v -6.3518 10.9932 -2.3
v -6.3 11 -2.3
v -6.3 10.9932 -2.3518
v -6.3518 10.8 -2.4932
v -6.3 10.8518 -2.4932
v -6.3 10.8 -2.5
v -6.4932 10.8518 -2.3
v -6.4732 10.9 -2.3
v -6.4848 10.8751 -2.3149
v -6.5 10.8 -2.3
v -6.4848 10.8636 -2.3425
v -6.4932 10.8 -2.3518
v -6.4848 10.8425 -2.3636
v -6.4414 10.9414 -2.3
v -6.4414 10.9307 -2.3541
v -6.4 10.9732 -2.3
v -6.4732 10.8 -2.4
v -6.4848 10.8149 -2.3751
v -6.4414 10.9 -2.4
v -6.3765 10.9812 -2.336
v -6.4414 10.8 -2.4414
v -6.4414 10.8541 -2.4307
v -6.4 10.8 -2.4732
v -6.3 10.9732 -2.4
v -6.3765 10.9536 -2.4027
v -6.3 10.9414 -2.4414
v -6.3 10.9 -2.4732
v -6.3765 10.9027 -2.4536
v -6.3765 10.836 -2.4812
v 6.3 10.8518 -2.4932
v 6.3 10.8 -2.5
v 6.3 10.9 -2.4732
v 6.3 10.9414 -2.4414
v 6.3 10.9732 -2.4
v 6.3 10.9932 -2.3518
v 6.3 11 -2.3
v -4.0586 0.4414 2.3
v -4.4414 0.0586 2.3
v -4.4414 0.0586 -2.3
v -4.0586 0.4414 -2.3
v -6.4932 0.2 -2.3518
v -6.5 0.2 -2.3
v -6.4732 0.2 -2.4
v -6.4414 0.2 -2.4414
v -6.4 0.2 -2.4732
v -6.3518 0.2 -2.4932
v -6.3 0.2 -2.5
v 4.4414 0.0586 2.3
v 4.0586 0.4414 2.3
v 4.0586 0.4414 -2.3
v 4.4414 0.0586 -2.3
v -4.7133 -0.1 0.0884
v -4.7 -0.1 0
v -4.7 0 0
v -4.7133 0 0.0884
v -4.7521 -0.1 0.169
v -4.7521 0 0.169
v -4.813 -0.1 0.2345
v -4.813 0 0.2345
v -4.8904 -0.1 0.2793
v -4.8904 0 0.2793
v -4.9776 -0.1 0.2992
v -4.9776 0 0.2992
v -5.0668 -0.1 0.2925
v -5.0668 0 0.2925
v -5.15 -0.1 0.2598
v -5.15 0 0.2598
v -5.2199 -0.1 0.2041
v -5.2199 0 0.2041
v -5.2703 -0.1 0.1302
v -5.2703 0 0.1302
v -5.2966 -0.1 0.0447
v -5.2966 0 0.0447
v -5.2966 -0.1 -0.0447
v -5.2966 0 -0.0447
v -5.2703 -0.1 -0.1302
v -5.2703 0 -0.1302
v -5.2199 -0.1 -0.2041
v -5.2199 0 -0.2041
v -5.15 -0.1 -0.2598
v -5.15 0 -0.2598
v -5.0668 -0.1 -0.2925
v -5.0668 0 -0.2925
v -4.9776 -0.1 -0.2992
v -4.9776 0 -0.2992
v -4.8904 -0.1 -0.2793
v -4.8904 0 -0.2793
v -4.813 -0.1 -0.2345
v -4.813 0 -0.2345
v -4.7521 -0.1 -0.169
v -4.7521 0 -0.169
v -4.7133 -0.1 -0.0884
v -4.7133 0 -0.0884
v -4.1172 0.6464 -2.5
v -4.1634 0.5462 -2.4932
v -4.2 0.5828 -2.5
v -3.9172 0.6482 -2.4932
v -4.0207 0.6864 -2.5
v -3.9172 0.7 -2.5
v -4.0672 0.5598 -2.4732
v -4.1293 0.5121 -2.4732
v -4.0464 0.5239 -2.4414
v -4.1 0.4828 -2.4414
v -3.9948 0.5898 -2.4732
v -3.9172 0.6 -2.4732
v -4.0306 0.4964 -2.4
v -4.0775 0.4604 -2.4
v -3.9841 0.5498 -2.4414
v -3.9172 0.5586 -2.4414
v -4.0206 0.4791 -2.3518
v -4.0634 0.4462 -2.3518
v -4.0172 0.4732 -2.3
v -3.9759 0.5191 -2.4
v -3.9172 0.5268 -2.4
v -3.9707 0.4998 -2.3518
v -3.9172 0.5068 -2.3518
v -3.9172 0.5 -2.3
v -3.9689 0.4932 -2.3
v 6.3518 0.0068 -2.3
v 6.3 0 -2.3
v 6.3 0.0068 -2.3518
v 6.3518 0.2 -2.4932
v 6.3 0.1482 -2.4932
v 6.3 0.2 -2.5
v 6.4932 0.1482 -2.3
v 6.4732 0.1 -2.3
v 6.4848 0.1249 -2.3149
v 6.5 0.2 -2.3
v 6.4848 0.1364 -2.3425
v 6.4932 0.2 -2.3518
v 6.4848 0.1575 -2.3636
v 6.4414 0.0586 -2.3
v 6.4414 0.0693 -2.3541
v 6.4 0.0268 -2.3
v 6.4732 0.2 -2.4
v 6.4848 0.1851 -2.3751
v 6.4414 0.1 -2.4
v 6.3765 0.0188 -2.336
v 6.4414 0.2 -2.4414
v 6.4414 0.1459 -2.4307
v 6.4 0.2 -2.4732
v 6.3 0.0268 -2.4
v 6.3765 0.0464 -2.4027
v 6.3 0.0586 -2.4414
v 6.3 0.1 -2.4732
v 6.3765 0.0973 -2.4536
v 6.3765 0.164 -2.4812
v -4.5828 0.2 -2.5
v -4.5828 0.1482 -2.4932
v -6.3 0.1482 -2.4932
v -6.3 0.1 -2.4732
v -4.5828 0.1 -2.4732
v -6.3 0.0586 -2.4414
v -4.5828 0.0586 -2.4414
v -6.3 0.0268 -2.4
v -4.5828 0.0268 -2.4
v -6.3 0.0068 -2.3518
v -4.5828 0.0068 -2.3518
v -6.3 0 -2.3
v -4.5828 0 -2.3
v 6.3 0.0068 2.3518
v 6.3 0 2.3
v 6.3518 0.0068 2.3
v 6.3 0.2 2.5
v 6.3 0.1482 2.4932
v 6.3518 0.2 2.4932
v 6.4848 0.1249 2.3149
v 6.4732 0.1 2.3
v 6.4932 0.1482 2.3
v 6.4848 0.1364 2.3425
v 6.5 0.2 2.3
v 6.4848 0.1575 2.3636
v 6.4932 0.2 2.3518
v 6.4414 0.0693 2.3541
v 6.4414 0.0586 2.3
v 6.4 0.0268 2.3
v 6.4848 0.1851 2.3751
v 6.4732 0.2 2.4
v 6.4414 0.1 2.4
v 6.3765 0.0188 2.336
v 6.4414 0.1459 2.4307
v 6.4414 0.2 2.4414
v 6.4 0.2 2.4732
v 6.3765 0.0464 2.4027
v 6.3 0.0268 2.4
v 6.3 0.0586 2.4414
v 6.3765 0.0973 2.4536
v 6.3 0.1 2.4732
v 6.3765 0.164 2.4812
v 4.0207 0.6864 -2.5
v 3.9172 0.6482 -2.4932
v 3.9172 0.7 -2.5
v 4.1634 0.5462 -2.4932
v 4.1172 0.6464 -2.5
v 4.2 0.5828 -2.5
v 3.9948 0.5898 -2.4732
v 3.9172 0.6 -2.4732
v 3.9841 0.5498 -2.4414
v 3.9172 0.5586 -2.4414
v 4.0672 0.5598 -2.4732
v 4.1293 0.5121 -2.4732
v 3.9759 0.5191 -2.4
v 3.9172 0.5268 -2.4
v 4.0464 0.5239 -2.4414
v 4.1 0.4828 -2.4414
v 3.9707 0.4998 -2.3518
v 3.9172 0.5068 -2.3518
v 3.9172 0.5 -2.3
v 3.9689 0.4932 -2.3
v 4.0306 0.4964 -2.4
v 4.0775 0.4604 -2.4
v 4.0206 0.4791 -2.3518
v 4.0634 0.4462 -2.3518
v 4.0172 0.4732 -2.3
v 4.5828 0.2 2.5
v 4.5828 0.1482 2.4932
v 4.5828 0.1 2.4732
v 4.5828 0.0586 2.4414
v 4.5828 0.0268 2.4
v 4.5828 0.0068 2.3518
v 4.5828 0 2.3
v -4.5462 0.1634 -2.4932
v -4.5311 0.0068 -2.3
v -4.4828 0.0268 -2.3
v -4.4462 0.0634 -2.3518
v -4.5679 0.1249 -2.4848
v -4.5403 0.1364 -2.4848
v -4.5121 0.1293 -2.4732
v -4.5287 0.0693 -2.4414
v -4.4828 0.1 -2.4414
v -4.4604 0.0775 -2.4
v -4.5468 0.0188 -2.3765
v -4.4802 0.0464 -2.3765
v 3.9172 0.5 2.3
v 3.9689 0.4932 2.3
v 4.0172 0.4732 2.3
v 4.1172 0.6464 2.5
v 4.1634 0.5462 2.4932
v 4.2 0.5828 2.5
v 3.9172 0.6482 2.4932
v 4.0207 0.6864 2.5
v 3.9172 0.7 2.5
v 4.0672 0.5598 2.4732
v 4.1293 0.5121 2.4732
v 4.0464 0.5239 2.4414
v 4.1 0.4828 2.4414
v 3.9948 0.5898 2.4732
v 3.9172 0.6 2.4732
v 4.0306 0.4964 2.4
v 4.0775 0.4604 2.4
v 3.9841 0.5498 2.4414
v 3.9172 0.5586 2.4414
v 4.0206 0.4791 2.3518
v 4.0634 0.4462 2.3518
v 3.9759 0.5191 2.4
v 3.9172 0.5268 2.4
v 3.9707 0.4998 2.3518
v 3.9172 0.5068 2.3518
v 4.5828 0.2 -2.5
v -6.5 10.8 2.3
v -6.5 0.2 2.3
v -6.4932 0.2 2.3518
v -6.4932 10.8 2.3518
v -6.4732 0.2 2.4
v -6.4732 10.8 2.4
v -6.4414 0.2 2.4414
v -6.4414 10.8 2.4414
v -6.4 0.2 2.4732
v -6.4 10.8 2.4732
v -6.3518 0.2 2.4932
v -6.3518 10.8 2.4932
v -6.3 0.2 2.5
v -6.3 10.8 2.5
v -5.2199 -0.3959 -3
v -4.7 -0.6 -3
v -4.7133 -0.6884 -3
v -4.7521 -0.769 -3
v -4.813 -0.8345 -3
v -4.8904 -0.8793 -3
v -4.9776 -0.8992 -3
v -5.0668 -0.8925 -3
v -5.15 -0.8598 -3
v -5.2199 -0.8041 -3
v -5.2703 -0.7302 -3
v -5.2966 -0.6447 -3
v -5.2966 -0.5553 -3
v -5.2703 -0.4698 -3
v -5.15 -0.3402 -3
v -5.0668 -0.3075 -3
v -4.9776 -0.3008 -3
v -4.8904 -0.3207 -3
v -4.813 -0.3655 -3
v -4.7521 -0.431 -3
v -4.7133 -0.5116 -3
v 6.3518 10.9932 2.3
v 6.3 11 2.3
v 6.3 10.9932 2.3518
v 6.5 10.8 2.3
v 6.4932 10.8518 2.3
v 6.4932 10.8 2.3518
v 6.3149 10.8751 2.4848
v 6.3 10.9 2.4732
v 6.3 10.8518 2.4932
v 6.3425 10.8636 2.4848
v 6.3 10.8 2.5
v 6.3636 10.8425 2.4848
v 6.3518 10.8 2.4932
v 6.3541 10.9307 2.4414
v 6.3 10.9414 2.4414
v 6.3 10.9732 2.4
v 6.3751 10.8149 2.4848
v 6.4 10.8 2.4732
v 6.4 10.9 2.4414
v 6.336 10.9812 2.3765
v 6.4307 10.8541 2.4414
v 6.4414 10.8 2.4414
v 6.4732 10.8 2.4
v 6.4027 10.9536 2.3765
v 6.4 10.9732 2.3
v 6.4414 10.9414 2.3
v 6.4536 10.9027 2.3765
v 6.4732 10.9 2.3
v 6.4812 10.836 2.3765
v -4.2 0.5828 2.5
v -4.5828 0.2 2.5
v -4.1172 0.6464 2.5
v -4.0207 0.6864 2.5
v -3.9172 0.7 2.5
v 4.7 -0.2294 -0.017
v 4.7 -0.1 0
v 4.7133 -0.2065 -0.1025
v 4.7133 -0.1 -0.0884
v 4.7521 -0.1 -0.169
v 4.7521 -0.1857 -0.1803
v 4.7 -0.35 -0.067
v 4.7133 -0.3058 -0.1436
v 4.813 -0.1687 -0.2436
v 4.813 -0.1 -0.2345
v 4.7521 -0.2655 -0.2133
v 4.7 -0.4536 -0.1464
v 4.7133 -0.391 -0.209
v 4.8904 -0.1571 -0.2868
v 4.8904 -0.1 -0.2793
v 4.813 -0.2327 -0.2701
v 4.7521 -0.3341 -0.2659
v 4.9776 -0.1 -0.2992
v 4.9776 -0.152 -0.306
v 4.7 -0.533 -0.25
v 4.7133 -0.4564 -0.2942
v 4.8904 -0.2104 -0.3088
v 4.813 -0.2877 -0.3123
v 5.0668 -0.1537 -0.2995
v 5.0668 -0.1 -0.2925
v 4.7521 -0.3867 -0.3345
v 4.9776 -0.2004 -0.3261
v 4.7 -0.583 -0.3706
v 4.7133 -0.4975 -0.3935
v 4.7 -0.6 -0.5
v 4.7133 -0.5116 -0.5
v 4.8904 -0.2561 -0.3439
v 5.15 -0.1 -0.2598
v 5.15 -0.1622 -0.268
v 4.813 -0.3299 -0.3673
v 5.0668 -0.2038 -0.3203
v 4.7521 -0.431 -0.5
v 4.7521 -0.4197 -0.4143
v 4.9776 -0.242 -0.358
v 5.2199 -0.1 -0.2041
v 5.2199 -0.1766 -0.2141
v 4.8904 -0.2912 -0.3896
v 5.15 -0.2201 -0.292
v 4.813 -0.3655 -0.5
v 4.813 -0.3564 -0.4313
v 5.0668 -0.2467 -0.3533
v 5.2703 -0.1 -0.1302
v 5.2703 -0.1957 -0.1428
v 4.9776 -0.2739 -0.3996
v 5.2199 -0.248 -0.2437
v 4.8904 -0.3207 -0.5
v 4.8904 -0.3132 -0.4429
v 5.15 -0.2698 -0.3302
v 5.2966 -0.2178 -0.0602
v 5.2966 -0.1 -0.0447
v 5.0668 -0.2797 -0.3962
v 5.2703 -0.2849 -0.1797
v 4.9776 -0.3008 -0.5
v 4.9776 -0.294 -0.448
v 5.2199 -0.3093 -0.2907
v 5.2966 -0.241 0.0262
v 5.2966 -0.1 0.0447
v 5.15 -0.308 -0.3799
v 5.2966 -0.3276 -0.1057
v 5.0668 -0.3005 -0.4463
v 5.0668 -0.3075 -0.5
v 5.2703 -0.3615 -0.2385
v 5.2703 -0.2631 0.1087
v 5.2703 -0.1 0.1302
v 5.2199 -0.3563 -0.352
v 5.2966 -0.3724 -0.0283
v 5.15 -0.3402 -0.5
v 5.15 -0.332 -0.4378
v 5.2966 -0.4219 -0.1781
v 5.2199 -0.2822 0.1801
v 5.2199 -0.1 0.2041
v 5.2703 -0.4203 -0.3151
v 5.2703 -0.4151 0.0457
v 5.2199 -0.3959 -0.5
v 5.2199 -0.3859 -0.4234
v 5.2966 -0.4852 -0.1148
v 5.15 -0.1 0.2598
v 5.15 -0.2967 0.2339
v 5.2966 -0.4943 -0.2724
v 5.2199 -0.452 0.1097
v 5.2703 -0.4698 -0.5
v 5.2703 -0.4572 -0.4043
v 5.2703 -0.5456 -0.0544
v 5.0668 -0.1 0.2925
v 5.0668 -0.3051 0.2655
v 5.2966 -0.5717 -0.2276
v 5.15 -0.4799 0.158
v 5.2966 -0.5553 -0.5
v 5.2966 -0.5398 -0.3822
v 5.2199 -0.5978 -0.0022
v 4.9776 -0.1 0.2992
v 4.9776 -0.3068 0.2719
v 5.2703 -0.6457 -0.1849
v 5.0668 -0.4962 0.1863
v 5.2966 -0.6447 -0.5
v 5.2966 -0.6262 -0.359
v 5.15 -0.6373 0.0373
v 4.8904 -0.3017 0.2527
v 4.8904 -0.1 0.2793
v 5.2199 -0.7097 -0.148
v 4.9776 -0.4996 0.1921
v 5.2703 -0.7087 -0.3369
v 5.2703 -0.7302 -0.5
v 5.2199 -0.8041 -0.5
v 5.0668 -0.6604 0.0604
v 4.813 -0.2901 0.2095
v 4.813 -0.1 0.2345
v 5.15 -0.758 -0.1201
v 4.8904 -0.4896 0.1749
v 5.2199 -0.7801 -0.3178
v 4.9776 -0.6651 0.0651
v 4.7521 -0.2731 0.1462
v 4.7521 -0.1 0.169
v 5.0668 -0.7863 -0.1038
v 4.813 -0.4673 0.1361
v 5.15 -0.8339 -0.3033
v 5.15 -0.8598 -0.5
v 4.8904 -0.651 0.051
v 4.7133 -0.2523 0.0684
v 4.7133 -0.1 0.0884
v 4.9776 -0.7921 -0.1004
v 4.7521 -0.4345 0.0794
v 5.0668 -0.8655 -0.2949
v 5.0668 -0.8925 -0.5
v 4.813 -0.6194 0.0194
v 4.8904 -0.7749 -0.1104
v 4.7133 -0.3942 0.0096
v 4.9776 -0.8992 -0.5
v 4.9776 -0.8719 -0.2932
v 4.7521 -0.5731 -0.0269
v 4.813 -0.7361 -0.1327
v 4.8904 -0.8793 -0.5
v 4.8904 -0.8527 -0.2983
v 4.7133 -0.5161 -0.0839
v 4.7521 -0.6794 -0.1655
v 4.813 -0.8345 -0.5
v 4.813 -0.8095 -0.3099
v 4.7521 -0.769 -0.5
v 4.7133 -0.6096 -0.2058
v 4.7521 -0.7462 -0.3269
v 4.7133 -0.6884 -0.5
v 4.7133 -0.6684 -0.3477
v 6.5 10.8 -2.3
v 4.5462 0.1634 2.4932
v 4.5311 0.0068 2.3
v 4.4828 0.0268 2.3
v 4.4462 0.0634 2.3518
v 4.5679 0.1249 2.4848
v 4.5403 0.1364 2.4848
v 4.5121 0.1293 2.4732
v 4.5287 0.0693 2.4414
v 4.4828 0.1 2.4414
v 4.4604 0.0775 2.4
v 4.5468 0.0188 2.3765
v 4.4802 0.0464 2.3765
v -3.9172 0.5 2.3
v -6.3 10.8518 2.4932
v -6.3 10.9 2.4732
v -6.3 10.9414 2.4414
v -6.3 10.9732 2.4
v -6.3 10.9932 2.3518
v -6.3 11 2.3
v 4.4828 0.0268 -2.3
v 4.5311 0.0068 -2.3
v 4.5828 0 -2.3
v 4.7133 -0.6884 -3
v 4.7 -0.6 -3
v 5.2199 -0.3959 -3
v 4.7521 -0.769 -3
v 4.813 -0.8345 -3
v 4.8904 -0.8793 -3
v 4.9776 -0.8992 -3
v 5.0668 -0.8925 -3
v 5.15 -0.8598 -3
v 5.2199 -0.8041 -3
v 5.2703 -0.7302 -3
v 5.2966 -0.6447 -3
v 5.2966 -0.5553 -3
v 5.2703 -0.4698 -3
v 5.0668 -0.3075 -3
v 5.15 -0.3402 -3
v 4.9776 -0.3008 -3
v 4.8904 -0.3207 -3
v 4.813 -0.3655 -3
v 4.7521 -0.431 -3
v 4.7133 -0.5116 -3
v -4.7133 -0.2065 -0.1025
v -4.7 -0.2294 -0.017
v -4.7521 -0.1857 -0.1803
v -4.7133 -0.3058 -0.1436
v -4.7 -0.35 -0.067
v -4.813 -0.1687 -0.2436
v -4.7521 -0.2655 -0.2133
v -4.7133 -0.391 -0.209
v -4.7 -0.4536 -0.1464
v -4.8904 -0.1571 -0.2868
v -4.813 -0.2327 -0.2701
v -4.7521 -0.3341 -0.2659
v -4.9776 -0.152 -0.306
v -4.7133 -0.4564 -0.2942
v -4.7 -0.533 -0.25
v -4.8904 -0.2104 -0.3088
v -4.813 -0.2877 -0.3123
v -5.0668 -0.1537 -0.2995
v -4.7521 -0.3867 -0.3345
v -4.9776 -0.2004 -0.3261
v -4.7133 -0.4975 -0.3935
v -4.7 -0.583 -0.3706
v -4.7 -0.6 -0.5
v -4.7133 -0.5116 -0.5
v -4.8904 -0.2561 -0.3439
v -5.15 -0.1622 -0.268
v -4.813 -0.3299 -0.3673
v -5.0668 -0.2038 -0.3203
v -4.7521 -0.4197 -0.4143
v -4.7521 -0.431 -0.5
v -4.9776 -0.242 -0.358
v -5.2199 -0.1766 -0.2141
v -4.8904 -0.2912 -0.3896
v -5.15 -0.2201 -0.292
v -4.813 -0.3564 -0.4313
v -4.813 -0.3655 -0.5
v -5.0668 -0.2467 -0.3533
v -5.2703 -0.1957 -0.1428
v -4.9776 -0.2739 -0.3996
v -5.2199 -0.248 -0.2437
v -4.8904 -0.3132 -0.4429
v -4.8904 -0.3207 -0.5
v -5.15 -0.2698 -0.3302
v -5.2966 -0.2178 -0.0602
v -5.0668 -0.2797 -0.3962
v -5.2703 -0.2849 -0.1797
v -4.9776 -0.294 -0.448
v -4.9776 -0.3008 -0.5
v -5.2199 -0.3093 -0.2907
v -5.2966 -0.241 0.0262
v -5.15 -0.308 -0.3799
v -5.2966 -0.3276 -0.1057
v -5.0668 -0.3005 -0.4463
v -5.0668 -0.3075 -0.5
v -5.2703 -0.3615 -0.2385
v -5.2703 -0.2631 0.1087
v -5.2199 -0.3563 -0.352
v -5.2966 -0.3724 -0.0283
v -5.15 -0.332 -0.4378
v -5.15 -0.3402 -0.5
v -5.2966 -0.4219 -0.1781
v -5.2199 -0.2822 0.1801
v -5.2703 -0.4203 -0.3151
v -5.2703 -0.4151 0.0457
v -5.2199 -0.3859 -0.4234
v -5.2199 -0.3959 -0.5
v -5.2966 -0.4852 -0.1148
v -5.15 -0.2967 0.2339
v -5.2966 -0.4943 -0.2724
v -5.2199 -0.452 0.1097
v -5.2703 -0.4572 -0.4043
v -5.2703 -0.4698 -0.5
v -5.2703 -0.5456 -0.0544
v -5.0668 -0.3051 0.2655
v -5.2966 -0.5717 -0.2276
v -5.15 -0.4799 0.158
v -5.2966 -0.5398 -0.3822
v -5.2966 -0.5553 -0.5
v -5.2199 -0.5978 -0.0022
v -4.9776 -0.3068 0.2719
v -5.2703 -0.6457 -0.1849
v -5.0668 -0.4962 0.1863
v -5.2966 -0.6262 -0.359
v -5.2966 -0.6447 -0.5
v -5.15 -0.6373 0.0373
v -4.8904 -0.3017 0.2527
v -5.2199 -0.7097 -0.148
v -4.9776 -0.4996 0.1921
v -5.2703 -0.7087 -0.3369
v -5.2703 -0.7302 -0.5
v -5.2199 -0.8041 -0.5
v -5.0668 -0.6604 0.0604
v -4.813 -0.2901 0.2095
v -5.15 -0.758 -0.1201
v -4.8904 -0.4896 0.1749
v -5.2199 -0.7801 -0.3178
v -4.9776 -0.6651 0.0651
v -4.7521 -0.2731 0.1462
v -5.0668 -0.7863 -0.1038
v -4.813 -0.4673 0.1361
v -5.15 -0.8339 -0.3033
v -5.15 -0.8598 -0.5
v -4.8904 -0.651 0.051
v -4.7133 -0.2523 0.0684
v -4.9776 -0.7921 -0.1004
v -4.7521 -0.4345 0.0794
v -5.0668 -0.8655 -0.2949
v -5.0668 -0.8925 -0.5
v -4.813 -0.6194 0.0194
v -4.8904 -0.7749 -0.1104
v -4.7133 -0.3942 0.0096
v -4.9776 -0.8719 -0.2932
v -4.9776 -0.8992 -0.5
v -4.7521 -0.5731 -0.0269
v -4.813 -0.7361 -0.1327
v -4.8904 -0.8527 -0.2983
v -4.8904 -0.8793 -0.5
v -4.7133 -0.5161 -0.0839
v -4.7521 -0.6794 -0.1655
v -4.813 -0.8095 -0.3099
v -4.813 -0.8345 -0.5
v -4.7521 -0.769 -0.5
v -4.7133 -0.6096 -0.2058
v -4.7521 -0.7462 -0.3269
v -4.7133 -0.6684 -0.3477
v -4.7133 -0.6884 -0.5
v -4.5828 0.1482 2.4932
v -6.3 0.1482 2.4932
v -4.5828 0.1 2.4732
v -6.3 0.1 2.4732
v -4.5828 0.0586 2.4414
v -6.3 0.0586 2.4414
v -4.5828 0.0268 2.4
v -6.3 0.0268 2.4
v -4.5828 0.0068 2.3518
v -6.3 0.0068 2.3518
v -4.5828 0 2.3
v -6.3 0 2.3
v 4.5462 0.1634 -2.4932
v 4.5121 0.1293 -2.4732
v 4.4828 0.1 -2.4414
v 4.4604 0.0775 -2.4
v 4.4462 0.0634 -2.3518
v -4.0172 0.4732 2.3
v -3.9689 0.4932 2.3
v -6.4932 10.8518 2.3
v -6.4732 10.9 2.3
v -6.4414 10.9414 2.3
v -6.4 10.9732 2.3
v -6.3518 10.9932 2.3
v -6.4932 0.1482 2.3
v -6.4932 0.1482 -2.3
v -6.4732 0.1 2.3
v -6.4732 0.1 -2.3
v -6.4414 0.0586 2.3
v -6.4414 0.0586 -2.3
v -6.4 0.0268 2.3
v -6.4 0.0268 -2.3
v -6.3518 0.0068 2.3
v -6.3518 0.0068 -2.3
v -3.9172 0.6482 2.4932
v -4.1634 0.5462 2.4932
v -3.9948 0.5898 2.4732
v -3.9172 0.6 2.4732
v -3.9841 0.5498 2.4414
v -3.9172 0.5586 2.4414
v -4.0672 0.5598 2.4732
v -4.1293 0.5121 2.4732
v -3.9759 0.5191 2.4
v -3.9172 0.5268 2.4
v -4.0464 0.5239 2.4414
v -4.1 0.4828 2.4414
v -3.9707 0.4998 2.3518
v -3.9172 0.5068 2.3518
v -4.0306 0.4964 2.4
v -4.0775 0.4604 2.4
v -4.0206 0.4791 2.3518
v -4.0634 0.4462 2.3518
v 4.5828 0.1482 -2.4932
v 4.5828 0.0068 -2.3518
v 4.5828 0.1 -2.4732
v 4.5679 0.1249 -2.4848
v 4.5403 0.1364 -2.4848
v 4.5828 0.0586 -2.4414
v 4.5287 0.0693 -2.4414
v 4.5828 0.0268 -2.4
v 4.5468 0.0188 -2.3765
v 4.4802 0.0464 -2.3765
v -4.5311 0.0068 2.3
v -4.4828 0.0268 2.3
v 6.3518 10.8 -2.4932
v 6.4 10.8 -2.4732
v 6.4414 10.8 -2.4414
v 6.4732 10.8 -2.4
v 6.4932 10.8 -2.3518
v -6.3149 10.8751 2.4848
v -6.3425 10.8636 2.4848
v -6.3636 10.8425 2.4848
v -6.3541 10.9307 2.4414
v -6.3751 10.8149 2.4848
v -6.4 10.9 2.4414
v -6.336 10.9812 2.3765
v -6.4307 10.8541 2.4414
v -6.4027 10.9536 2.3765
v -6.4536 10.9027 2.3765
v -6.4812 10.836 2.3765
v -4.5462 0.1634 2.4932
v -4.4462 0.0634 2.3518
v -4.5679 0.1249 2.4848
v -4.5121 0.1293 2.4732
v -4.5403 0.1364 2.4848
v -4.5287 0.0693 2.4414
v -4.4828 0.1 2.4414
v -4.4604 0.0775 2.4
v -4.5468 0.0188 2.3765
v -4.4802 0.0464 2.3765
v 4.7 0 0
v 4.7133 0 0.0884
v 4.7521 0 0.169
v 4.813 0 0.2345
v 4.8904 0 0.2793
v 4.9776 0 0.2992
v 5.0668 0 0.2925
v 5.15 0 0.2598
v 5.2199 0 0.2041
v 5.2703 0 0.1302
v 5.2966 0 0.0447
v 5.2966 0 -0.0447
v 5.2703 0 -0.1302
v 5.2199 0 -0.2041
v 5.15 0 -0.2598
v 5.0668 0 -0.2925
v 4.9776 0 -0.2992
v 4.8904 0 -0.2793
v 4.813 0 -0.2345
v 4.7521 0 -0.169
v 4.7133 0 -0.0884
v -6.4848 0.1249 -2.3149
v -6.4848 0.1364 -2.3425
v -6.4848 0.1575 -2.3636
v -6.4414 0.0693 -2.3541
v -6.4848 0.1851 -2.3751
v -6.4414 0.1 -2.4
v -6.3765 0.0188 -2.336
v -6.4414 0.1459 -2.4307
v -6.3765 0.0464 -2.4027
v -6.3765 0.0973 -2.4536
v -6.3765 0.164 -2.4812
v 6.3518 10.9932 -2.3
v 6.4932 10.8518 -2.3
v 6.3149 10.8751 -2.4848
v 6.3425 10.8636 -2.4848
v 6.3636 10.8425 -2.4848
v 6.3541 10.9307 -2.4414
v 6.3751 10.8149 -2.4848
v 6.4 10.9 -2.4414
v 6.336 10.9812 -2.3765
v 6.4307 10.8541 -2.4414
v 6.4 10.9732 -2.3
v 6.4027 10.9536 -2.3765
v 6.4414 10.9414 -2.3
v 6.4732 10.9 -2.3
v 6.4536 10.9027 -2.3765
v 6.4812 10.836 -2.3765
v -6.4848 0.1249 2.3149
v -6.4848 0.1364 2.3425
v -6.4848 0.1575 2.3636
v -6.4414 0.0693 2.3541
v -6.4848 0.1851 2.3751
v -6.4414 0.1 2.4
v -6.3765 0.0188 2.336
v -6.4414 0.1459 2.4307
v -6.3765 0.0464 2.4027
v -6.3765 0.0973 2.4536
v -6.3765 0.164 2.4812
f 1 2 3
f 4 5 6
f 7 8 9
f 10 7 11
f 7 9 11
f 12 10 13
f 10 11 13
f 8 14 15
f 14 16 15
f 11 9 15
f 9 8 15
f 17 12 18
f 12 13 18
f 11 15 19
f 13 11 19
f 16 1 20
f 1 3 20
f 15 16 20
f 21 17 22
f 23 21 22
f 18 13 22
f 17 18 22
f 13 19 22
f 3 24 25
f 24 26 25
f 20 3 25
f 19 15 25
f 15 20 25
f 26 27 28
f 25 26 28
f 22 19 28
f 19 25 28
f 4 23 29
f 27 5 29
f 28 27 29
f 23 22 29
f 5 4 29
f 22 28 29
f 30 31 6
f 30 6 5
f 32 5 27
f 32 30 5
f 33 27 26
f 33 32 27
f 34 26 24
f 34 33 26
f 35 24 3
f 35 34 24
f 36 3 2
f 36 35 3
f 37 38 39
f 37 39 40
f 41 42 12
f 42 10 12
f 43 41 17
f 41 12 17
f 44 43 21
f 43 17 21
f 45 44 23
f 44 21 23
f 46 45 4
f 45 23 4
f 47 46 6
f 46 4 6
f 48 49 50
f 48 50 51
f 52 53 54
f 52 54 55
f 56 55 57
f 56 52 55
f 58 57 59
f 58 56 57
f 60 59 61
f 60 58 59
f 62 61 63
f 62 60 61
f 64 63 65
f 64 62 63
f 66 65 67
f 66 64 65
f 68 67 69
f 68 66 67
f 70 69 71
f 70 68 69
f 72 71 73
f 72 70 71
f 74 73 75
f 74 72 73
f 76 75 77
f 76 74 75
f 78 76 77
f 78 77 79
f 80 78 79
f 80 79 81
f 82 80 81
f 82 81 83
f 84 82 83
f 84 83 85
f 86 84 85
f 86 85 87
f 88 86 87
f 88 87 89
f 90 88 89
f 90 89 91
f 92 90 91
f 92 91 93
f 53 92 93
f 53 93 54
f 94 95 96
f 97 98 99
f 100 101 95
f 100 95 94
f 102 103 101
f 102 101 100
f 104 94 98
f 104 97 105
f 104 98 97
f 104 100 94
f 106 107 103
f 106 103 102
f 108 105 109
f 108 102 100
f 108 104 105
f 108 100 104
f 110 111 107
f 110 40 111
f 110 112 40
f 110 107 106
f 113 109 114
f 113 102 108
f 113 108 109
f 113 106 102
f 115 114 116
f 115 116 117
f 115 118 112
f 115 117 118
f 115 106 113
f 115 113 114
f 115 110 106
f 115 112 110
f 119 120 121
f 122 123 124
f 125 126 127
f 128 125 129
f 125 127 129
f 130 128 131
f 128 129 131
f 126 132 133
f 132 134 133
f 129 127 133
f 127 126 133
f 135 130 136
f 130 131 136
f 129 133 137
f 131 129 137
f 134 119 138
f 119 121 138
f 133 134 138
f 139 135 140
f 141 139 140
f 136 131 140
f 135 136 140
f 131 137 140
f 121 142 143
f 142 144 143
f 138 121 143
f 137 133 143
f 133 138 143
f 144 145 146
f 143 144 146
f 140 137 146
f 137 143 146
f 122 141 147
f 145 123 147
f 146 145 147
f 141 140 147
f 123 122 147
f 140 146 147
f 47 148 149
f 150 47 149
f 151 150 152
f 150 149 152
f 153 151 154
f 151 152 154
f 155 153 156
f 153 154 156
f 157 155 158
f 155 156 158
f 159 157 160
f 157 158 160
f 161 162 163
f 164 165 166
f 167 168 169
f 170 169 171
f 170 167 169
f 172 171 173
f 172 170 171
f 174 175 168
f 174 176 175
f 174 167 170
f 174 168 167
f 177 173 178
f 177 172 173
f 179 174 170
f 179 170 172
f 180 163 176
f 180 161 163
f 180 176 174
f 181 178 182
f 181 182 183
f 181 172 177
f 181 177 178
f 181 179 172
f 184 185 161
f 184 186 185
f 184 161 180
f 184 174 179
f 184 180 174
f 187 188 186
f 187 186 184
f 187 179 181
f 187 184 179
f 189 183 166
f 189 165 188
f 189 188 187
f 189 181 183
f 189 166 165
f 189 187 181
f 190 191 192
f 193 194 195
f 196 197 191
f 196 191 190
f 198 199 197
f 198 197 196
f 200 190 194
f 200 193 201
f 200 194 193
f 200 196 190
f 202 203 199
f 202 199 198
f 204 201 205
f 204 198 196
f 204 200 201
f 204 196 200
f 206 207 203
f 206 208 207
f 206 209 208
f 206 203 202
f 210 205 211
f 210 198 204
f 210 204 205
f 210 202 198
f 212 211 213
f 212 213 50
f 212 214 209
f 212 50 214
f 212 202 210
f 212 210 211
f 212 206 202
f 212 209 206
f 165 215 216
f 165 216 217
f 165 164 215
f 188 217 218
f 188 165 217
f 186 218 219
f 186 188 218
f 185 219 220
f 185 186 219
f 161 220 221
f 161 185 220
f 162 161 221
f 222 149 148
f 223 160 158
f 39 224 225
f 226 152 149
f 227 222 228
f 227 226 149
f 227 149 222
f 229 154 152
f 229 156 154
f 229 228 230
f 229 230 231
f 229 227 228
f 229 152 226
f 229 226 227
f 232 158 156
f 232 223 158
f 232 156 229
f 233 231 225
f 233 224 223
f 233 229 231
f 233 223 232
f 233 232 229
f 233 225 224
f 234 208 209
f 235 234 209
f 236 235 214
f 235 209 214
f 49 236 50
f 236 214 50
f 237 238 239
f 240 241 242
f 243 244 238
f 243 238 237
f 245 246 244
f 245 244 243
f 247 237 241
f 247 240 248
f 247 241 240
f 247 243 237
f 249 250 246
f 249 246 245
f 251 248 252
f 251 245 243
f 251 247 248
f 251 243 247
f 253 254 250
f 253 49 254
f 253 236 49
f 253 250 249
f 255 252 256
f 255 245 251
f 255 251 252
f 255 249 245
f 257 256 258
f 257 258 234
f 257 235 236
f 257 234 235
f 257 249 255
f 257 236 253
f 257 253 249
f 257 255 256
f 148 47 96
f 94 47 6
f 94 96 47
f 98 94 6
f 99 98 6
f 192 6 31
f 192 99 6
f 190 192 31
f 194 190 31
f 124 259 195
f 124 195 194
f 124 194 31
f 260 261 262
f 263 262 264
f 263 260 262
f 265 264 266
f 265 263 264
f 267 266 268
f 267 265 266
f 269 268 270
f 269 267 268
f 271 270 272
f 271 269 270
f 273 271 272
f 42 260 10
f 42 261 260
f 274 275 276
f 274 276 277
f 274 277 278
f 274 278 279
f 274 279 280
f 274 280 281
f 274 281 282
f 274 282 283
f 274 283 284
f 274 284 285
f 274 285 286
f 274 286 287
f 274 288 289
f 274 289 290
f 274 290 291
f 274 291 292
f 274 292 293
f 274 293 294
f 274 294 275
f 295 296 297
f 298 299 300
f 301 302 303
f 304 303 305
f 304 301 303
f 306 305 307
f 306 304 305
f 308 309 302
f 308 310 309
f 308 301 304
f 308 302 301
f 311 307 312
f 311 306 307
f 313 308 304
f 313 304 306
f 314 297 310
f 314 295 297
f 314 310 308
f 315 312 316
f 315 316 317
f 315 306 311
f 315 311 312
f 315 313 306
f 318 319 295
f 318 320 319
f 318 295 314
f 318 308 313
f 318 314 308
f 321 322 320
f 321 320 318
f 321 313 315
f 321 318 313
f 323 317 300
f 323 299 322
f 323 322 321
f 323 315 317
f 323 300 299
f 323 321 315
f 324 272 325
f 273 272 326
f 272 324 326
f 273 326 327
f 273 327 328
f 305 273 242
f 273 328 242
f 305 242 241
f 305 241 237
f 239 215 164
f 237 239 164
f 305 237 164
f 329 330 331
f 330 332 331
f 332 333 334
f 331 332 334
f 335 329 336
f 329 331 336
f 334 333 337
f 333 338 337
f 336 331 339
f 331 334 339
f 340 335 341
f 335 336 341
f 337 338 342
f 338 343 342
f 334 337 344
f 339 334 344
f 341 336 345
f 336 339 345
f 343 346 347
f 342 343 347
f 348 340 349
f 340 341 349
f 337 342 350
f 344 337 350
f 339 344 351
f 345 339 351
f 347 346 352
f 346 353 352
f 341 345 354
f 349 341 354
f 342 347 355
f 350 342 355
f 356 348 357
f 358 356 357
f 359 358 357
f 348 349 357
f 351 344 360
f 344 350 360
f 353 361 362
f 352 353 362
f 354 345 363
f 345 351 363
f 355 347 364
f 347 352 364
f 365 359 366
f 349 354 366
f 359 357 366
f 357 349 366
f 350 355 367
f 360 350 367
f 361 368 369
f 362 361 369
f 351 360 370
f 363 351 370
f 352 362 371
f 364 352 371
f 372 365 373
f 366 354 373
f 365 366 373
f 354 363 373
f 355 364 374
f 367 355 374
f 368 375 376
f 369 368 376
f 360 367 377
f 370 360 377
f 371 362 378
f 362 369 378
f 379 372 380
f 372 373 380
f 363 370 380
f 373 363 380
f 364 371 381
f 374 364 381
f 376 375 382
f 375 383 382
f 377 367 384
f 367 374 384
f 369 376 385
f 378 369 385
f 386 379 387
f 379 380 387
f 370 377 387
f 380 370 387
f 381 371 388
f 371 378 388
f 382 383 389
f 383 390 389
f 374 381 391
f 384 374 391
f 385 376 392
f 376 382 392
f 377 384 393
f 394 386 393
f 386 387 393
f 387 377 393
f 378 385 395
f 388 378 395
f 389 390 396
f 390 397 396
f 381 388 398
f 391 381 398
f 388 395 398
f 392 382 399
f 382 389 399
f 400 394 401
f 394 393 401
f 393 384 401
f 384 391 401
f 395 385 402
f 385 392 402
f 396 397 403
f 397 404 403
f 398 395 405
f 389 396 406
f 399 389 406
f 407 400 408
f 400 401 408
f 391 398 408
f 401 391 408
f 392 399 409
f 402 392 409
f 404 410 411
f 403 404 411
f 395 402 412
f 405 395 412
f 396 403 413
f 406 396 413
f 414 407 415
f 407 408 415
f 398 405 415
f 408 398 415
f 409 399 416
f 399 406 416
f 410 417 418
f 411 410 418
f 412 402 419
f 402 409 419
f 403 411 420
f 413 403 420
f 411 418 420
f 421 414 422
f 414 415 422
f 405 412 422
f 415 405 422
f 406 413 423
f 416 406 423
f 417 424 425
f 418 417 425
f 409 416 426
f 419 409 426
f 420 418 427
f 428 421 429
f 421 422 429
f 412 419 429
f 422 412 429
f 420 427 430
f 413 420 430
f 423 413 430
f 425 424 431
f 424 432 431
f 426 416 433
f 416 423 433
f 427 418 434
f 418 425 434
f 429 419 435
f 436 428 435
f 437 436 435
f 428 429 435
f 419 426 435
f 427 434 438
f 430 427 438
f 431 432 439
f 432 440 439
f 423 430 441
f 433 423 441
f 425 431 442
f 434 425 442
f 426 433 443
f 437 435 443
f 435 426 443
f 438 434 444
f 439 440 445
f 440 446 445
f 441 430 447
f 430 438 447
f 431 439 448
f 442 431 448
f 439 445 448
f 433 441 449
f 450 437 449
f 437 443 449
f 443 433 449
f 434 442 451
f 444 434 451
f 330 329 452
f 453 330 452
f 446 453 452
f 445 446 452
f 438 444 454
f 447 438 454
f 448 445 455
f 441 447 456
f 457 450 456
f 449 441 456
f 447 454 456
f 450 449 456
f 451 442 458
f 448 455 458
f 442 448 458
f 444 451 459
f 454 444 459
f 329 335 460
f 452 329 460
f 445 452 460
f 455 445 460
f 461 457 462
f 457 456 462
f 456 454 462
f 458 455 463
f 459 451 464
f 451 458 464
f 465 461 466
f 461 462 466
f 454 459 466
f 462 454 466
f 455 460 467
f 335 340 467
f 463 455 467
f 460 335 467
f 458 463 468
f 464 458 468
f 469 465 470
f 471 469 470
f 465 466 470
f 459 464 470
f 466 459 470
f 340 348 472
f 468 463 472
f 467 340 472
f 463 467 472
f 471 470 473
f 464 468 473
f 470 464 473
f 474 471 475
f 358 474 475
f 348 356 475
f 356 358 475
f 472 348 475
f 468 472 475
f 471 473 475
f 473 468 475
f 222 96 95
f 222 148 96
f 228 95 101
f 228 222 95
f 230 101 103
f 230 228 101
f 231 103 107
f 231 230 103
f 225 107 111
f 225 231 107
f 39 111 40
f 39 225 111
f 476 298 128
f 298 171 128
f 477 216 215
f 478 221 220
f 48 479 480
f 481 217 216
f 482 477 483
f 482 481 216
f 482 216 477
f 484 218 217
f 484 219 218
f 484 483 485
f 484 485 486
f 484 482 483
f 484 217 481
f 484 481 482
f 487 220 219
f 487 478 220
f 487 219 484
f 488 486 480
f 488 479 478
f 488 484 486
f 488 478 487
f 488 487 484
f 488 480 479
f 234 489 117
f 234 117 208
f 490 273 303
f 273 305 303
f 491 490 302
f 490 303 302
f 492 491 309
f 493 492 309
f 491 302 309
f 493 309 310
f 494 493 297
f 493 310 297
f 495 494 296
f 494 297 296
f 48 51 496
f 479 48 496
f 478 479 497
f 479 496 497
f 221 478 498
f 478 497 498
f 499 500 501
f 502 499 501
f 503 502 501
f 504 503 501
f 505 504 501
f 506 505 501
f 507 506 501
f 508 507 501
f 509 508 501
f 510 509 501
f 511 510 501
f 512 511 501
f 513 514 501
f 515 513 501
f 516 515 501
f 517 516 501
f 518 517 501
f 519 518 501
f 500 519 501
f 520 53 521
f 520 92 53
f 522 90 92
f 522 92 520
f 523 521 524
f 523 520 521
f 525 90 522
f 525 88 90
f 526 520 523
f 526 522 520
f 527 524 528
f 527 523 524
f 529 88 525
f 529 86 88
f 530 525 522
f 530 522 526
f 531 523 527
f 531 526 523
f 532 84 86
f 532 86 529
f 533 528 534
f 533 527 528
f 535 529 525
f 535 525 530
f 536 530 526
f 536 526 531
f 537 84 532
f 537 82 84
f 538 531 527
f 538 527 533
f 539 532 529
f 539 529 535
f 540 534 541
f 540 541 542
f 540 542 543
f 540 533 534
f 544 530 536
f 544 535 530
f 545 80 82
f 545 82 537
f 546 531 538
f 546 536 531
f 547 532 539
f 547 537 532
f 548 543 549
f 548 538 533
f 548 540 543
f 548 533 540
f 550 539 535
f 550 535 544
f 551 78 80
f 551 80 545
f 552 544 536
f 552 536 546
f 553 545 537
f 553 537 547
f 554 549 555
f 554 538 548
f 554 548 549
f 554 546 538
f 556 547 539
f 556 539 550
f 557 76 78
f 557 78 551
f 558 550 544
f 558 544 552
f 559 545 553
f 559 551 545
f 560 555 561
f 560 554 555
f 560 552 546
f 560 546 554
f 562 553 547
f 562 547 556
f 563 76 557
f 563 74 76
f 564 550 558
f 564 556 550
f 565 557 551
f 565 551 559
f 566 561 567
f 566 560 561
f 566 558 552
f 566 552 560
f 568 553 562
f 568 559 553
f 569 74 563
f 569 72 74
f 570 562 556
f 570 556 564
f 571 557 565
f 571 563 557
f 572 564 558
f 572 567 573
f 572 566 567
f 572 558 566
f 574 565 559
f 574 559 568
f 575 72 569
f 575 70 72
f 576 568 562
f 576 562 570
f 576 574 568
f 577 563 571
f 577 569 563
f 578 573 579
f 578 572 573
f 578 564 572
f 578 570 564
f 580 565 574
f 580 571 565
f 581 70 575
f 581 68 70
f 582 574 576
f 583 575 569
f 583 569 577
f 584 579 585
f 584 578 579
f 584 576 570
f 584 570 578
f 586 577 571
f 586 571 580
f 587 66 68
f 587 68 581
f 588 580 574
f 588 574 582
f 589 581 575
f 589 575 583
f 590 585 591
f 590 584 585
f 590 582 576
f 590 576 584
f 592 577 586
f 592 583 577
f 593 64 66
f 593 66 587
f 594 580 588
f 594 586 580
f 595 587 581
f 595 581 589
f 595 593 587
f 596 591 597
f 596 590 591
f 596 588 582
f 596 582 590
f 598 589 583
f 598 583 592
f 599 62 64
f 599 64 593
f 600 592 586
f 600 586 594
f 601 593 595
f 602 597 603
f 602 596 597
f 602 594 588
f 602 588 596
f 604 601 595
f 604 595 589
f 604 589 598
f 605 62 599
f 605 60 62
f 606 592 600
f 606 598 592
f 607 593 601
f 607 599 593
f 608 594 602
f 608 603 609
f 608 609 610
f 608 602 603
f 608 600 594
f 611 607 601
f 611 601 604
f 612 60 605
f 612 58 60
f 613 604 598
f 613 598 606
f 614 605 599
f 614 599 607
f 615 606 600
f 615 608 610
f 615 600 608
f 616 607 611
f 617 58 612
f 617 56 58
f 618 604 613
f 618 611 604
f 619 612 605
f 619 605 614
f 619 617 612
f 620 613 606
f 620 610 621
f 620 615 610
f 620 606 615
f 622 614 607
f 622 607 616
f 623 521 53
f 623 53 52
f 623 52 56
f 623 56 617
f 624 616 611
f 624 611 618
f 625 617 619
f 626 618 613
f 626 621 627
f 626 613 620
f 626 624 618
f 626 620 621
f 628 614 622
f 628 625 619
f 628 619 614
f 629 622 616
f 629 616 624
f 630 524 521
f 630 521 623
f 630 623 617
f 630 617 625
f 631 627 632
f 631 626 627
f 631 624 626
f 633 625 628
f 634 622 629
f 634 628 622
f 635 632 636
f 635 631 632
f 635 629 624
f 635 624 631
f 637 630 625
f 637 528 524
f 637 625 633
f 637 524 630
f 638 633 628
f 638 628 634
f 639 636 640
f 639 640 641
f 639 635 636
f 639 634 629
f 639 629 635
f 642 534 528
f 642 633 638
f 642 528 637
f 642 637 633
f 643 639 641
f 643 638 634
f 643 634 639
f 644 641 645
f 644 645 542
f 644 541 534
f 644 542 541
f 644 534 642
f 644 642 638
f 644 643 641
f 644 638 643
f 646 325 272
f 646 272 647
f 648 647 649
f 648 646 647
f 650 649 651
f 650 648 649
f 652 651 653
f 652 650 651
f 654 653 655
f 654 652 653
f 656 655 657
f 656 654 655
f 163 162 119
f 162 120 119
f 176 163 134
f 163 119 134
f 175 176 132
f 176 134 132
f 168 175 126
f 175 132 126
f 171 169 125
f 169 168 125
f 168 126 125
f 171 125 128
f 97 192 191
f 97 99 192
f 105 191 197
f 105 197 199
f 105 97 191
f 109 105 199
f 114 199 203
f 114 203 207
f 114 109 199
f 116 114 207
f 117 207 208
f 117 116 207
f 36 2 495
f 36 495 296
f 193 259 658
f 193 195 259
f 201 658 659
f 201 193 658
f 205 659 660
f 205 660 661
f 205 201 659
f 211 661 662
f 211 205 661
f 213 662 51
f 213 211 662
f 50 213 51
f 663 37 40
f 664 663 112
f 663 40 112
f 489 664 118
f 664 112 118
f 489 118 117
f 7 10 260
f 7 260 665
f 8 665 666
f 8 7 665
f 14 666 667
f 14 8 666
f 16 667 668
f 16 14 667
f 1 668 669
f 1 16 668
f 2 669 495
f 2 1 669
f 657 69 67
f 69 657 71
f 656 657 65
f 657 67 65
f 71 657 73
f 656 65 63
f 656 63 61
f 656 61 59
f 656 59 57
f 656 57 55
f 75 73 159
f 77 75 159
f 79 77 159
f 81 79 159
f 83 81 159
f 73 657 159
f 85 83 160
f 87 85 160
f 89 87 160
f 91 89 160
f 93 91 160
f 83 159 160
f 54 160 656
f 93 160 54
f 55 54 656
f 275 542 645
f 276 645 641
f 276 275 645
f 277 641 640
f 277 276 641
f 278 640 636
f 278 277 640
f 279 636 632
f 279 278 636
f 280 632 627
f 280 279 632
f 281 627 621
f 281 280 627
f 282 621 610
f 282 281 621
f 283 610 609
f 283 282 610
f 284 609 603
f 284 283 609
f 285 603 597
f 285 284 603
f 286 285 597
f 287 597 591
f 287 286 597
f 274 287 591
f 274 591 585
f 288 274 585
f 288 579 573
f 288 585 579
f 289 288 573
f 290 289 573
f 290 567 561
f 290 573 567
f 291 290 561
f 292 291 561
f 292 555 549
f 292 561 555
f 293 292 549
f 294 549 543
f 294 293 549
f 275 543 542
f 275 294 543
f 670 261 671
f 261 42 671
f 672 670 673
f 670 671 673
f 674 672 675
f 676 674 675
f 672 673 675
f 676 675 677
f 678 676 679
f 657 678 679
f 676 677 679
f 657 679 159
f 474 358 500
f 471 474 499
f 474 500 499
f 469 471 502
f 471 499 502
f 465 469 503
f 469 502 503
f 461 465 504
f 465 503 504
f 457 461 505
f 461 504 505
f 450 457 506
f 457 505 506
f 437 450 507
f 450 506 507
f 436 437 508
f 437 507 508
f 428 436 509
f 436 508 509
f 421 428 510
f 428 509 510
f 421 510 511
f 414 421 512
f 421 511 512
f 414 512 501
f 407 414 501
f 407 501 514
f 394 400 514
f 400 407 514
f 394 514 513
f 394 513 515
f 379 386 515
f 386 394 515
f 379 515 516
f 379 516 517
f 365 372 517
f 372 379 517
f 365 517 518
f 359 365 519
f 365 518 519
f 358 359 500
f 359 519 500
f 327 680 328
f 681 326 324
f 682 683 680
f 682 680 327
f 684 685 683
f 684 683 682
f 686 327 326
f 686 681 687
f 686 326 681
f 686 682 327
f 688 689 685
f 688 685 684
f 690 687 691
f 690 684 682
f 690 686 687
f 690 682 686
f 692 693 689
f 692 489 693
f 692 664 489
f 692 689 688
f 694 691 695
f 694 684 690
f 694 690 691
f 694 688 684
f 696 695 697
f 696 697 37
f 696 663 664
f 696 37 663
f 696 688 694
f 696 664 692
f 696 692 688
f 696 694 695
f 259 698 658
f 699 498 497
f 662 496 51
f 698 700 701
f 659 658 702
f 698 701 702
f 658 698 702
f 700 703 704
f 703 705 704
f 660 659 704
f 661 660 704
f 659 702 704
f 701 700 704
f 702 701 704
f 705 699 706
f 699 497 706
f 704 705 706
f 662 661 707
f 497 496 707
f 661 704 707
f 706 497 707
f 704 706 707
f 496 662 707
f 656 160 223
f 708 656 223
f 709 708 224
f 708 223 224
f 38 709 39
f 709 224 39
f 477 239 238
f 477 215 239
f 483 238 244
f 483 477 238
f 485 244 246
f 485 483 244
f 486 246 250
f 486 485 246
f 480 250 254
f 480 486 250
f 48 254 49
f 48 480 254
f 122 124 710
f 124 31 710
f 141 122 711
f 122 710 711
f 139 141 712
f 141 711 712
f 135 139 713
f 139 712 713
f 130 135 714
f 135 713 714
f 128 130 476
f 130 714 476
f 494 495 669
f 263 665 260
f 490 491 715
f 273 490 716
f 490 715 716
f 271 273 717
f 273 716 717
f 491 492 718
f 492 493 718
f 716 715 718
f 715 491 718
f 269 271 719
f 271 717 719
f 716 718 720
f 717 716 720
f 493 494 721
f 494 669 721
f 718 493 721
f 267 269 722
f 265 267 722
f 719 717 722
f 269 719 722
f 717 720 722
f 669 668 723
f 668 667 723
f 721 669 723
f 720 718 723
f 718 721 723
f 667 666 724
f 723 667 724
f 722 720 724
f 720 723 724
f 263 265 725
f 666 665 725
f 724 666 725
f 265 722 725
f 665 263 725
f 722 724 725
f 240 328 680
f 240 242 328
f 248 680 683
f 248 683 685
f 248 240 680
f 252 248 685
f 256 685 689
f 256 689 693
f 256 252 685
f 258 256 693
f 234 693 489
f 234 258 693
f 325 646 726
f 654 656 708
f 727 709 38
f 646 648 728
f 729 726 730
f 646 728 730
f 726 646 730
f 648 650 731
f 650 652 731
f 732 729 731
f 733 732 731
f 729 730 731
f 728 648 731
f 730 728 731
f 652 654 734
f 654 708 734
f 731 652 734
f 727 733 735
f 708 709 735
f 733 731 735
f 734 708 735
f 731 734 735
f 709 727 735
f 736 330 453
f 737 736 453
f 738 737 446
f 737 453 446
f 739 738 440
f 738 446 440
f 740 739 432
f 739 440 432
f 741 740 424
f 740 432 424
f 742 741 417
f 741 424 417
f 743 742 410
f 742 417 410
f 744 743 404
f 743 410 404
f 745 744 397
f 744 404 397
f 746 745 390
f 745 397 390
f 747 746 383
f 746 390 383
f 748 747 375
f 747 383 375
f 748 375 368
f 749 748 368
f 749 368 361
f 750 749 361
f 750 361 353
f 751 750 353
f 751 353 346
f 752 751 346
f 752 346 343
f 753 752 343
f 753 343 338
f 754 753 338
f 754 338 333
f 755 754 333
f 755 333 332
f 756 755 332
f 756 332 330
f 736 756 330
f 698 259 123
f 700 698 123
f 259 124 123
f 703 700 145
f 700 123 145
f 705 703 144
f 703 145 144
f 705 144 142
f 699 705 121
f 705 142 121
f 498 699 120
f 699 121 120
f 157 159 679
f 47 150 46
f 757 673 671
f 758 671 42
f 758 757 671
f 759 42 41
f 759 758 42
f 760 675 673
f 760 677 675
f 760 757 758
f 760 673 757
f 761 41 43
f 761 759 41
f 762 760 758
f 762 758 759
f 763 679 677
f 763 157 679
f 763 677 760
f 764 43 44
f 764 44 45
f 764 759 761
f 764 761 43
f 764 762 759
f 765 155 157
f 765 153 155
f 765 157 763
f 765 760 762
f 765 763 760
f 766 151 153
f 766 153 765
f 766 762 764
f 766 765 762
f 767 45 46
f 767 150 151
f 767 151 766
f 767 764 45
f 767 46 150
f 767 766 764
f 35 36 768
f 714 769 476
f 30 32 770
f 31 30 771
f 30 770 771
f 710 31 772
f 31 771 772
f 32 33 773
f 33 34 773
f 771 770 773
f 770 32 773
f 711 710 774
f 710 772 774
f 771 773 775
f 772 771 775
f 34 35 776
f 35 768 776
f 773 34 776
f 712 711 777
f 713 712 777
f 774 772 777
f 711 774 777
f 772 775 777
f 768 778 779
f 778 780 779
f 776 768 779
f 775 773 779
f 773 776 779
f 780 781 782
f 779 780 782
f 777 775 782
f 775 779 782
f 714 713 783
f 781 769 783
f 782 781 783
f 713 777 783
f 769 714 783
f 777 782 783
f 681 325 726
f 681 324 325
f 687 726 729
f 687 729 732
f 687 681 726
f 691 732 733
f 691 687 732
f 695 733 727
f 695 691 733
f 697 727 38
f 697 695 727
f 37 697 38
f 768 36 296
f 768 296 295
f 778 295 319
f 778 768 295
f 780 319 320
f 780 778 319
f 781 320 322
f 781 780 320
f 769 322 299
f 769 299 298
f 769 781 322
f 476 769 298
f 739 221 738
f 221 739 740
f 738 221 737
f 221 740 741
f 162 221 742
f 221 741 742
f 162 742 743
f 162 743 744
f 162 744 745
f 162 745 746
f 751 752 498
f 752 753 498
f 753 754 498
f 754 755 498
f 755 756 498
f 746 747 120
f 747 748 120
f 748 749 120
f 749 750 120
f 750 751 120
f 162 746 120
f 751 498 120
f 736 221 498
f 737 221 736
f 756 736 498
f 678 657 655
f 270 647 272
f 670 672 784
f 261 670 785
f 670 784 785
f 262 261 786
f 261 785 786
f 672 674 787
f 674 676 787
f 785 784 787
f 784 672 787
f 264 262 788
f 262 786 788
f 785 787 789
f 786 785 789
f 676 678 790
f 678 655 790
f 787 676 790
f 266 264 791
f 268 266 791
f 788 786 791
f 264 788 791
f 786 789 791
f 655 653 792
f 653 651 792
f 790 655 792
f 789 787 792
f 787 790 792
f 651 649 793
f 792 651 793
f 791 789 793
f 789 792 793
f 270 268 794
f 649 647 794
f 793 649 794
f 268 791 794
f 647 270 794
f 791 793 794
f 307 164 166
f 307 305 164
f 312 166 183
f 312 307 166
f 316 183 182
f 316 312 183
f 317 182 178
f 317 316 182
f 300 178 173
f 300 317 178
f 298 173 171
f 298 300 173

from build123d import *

# Parameters (mm, degrees)
SKETCH1_W           = 13
SKETCH1_H           = 5
BOSS_EXTRUDE1_DEPTH = 11
CUT_EXTRUDE1_DEPTH  = 6
FILLET1_R           = 0.2
SKETCH3_R           = 0.3


with BuildPart() as part:
    # Sketch1 → Boss-Extrude1 (new body)
    with BuildSketch(Plane(origin=(0, 0, 0), x_dir=(1, 0, 0), z_dir=(0, 1, 0))):
        Rectangle(SKETCH1_W, SKETCH1_H)
    extrude(amount=BOSS_EXTRUDE1_DEPTH)

    # Sketch2 → Cut-Extrude1 (cut, through all)
    with BuildSketch(Plane.XY.offset(2.5)):
        Polygon((-4.5, 0), (-4, 0.5), (4, 0.5), (4.5, 0), (4.5, -1.5), (-4.5, -1.5), align=None)
    extrude(amount=-CUT_EXTRUDE1_DEPTH, mode=Mode.SUBTRACT)

    # Fillet1
    fillet1_edges = [part.edges().sort_by_distance(p)[0] for p in [
        (6.5, 11, 0),
        (0, 11, -2.5),
        (-5.5, 0, -2.5),
        (5.5, 0, 2.5),
        (4.25, 0.25, 2.5),
        (0, 0.5, 2.5),
        (-4.25, 0.25, 2.5),
        (-4.25, 0.25, -2.5),
        (-4.5, 0, 0),
        (0, 0.5, -2.5),
        (-4, 0.5, 0),
        (4.25, 0.25, -2.5),
        (4, 0.5, 0),
        (4.5, 0, 0),
        (-6.5, 11, 0),
        (5.5, 0, -2.5),
        (6.5, 0, 0),
        (-5.5, 0, 2.5),
        (-6.5, 0, 0),
        (0, 11, 2.5),
        (-6.5, 5.5, -2.5),
        (6.5, 5.5, -2.5),
        (6.5, 5.5, 2.5),
        (-6.5, 5.5, 2.5),
    ]]
    fillet(fillet1_edges, radius=FILLET1_R)

    # Sweep1: sweep along a path in Sketch5
    with BuildLine(Plane(origin=(-5, 0, 0), x_dir=(0, 0, -1), z_dir=(1, 0, 0))) as sweep1_path:
        Line((0, 0), (0, -0.1))
        ThreePointArc((0, -0.1), (0.146446609, -0.453553391), (0.5, -0.6))
        Line((0.5, -0.6), (3, -0.6))
    # Sketch3 → Sweep1 (sweep)
    with BuildSketch(Plane.XZ):
        with Locations((-5, 0)):
            Circle(SKETCH3_R)
    sweep1 = sweep(path=sweep1_path.line)

    # Mirror1: Sweep1 across plane
    add(sweep1.mirror(Plane(origin=(0, 0, 0), x_dir=(0, 0, 1), z_dir=(1, 0, 0))))


solid = part.part
